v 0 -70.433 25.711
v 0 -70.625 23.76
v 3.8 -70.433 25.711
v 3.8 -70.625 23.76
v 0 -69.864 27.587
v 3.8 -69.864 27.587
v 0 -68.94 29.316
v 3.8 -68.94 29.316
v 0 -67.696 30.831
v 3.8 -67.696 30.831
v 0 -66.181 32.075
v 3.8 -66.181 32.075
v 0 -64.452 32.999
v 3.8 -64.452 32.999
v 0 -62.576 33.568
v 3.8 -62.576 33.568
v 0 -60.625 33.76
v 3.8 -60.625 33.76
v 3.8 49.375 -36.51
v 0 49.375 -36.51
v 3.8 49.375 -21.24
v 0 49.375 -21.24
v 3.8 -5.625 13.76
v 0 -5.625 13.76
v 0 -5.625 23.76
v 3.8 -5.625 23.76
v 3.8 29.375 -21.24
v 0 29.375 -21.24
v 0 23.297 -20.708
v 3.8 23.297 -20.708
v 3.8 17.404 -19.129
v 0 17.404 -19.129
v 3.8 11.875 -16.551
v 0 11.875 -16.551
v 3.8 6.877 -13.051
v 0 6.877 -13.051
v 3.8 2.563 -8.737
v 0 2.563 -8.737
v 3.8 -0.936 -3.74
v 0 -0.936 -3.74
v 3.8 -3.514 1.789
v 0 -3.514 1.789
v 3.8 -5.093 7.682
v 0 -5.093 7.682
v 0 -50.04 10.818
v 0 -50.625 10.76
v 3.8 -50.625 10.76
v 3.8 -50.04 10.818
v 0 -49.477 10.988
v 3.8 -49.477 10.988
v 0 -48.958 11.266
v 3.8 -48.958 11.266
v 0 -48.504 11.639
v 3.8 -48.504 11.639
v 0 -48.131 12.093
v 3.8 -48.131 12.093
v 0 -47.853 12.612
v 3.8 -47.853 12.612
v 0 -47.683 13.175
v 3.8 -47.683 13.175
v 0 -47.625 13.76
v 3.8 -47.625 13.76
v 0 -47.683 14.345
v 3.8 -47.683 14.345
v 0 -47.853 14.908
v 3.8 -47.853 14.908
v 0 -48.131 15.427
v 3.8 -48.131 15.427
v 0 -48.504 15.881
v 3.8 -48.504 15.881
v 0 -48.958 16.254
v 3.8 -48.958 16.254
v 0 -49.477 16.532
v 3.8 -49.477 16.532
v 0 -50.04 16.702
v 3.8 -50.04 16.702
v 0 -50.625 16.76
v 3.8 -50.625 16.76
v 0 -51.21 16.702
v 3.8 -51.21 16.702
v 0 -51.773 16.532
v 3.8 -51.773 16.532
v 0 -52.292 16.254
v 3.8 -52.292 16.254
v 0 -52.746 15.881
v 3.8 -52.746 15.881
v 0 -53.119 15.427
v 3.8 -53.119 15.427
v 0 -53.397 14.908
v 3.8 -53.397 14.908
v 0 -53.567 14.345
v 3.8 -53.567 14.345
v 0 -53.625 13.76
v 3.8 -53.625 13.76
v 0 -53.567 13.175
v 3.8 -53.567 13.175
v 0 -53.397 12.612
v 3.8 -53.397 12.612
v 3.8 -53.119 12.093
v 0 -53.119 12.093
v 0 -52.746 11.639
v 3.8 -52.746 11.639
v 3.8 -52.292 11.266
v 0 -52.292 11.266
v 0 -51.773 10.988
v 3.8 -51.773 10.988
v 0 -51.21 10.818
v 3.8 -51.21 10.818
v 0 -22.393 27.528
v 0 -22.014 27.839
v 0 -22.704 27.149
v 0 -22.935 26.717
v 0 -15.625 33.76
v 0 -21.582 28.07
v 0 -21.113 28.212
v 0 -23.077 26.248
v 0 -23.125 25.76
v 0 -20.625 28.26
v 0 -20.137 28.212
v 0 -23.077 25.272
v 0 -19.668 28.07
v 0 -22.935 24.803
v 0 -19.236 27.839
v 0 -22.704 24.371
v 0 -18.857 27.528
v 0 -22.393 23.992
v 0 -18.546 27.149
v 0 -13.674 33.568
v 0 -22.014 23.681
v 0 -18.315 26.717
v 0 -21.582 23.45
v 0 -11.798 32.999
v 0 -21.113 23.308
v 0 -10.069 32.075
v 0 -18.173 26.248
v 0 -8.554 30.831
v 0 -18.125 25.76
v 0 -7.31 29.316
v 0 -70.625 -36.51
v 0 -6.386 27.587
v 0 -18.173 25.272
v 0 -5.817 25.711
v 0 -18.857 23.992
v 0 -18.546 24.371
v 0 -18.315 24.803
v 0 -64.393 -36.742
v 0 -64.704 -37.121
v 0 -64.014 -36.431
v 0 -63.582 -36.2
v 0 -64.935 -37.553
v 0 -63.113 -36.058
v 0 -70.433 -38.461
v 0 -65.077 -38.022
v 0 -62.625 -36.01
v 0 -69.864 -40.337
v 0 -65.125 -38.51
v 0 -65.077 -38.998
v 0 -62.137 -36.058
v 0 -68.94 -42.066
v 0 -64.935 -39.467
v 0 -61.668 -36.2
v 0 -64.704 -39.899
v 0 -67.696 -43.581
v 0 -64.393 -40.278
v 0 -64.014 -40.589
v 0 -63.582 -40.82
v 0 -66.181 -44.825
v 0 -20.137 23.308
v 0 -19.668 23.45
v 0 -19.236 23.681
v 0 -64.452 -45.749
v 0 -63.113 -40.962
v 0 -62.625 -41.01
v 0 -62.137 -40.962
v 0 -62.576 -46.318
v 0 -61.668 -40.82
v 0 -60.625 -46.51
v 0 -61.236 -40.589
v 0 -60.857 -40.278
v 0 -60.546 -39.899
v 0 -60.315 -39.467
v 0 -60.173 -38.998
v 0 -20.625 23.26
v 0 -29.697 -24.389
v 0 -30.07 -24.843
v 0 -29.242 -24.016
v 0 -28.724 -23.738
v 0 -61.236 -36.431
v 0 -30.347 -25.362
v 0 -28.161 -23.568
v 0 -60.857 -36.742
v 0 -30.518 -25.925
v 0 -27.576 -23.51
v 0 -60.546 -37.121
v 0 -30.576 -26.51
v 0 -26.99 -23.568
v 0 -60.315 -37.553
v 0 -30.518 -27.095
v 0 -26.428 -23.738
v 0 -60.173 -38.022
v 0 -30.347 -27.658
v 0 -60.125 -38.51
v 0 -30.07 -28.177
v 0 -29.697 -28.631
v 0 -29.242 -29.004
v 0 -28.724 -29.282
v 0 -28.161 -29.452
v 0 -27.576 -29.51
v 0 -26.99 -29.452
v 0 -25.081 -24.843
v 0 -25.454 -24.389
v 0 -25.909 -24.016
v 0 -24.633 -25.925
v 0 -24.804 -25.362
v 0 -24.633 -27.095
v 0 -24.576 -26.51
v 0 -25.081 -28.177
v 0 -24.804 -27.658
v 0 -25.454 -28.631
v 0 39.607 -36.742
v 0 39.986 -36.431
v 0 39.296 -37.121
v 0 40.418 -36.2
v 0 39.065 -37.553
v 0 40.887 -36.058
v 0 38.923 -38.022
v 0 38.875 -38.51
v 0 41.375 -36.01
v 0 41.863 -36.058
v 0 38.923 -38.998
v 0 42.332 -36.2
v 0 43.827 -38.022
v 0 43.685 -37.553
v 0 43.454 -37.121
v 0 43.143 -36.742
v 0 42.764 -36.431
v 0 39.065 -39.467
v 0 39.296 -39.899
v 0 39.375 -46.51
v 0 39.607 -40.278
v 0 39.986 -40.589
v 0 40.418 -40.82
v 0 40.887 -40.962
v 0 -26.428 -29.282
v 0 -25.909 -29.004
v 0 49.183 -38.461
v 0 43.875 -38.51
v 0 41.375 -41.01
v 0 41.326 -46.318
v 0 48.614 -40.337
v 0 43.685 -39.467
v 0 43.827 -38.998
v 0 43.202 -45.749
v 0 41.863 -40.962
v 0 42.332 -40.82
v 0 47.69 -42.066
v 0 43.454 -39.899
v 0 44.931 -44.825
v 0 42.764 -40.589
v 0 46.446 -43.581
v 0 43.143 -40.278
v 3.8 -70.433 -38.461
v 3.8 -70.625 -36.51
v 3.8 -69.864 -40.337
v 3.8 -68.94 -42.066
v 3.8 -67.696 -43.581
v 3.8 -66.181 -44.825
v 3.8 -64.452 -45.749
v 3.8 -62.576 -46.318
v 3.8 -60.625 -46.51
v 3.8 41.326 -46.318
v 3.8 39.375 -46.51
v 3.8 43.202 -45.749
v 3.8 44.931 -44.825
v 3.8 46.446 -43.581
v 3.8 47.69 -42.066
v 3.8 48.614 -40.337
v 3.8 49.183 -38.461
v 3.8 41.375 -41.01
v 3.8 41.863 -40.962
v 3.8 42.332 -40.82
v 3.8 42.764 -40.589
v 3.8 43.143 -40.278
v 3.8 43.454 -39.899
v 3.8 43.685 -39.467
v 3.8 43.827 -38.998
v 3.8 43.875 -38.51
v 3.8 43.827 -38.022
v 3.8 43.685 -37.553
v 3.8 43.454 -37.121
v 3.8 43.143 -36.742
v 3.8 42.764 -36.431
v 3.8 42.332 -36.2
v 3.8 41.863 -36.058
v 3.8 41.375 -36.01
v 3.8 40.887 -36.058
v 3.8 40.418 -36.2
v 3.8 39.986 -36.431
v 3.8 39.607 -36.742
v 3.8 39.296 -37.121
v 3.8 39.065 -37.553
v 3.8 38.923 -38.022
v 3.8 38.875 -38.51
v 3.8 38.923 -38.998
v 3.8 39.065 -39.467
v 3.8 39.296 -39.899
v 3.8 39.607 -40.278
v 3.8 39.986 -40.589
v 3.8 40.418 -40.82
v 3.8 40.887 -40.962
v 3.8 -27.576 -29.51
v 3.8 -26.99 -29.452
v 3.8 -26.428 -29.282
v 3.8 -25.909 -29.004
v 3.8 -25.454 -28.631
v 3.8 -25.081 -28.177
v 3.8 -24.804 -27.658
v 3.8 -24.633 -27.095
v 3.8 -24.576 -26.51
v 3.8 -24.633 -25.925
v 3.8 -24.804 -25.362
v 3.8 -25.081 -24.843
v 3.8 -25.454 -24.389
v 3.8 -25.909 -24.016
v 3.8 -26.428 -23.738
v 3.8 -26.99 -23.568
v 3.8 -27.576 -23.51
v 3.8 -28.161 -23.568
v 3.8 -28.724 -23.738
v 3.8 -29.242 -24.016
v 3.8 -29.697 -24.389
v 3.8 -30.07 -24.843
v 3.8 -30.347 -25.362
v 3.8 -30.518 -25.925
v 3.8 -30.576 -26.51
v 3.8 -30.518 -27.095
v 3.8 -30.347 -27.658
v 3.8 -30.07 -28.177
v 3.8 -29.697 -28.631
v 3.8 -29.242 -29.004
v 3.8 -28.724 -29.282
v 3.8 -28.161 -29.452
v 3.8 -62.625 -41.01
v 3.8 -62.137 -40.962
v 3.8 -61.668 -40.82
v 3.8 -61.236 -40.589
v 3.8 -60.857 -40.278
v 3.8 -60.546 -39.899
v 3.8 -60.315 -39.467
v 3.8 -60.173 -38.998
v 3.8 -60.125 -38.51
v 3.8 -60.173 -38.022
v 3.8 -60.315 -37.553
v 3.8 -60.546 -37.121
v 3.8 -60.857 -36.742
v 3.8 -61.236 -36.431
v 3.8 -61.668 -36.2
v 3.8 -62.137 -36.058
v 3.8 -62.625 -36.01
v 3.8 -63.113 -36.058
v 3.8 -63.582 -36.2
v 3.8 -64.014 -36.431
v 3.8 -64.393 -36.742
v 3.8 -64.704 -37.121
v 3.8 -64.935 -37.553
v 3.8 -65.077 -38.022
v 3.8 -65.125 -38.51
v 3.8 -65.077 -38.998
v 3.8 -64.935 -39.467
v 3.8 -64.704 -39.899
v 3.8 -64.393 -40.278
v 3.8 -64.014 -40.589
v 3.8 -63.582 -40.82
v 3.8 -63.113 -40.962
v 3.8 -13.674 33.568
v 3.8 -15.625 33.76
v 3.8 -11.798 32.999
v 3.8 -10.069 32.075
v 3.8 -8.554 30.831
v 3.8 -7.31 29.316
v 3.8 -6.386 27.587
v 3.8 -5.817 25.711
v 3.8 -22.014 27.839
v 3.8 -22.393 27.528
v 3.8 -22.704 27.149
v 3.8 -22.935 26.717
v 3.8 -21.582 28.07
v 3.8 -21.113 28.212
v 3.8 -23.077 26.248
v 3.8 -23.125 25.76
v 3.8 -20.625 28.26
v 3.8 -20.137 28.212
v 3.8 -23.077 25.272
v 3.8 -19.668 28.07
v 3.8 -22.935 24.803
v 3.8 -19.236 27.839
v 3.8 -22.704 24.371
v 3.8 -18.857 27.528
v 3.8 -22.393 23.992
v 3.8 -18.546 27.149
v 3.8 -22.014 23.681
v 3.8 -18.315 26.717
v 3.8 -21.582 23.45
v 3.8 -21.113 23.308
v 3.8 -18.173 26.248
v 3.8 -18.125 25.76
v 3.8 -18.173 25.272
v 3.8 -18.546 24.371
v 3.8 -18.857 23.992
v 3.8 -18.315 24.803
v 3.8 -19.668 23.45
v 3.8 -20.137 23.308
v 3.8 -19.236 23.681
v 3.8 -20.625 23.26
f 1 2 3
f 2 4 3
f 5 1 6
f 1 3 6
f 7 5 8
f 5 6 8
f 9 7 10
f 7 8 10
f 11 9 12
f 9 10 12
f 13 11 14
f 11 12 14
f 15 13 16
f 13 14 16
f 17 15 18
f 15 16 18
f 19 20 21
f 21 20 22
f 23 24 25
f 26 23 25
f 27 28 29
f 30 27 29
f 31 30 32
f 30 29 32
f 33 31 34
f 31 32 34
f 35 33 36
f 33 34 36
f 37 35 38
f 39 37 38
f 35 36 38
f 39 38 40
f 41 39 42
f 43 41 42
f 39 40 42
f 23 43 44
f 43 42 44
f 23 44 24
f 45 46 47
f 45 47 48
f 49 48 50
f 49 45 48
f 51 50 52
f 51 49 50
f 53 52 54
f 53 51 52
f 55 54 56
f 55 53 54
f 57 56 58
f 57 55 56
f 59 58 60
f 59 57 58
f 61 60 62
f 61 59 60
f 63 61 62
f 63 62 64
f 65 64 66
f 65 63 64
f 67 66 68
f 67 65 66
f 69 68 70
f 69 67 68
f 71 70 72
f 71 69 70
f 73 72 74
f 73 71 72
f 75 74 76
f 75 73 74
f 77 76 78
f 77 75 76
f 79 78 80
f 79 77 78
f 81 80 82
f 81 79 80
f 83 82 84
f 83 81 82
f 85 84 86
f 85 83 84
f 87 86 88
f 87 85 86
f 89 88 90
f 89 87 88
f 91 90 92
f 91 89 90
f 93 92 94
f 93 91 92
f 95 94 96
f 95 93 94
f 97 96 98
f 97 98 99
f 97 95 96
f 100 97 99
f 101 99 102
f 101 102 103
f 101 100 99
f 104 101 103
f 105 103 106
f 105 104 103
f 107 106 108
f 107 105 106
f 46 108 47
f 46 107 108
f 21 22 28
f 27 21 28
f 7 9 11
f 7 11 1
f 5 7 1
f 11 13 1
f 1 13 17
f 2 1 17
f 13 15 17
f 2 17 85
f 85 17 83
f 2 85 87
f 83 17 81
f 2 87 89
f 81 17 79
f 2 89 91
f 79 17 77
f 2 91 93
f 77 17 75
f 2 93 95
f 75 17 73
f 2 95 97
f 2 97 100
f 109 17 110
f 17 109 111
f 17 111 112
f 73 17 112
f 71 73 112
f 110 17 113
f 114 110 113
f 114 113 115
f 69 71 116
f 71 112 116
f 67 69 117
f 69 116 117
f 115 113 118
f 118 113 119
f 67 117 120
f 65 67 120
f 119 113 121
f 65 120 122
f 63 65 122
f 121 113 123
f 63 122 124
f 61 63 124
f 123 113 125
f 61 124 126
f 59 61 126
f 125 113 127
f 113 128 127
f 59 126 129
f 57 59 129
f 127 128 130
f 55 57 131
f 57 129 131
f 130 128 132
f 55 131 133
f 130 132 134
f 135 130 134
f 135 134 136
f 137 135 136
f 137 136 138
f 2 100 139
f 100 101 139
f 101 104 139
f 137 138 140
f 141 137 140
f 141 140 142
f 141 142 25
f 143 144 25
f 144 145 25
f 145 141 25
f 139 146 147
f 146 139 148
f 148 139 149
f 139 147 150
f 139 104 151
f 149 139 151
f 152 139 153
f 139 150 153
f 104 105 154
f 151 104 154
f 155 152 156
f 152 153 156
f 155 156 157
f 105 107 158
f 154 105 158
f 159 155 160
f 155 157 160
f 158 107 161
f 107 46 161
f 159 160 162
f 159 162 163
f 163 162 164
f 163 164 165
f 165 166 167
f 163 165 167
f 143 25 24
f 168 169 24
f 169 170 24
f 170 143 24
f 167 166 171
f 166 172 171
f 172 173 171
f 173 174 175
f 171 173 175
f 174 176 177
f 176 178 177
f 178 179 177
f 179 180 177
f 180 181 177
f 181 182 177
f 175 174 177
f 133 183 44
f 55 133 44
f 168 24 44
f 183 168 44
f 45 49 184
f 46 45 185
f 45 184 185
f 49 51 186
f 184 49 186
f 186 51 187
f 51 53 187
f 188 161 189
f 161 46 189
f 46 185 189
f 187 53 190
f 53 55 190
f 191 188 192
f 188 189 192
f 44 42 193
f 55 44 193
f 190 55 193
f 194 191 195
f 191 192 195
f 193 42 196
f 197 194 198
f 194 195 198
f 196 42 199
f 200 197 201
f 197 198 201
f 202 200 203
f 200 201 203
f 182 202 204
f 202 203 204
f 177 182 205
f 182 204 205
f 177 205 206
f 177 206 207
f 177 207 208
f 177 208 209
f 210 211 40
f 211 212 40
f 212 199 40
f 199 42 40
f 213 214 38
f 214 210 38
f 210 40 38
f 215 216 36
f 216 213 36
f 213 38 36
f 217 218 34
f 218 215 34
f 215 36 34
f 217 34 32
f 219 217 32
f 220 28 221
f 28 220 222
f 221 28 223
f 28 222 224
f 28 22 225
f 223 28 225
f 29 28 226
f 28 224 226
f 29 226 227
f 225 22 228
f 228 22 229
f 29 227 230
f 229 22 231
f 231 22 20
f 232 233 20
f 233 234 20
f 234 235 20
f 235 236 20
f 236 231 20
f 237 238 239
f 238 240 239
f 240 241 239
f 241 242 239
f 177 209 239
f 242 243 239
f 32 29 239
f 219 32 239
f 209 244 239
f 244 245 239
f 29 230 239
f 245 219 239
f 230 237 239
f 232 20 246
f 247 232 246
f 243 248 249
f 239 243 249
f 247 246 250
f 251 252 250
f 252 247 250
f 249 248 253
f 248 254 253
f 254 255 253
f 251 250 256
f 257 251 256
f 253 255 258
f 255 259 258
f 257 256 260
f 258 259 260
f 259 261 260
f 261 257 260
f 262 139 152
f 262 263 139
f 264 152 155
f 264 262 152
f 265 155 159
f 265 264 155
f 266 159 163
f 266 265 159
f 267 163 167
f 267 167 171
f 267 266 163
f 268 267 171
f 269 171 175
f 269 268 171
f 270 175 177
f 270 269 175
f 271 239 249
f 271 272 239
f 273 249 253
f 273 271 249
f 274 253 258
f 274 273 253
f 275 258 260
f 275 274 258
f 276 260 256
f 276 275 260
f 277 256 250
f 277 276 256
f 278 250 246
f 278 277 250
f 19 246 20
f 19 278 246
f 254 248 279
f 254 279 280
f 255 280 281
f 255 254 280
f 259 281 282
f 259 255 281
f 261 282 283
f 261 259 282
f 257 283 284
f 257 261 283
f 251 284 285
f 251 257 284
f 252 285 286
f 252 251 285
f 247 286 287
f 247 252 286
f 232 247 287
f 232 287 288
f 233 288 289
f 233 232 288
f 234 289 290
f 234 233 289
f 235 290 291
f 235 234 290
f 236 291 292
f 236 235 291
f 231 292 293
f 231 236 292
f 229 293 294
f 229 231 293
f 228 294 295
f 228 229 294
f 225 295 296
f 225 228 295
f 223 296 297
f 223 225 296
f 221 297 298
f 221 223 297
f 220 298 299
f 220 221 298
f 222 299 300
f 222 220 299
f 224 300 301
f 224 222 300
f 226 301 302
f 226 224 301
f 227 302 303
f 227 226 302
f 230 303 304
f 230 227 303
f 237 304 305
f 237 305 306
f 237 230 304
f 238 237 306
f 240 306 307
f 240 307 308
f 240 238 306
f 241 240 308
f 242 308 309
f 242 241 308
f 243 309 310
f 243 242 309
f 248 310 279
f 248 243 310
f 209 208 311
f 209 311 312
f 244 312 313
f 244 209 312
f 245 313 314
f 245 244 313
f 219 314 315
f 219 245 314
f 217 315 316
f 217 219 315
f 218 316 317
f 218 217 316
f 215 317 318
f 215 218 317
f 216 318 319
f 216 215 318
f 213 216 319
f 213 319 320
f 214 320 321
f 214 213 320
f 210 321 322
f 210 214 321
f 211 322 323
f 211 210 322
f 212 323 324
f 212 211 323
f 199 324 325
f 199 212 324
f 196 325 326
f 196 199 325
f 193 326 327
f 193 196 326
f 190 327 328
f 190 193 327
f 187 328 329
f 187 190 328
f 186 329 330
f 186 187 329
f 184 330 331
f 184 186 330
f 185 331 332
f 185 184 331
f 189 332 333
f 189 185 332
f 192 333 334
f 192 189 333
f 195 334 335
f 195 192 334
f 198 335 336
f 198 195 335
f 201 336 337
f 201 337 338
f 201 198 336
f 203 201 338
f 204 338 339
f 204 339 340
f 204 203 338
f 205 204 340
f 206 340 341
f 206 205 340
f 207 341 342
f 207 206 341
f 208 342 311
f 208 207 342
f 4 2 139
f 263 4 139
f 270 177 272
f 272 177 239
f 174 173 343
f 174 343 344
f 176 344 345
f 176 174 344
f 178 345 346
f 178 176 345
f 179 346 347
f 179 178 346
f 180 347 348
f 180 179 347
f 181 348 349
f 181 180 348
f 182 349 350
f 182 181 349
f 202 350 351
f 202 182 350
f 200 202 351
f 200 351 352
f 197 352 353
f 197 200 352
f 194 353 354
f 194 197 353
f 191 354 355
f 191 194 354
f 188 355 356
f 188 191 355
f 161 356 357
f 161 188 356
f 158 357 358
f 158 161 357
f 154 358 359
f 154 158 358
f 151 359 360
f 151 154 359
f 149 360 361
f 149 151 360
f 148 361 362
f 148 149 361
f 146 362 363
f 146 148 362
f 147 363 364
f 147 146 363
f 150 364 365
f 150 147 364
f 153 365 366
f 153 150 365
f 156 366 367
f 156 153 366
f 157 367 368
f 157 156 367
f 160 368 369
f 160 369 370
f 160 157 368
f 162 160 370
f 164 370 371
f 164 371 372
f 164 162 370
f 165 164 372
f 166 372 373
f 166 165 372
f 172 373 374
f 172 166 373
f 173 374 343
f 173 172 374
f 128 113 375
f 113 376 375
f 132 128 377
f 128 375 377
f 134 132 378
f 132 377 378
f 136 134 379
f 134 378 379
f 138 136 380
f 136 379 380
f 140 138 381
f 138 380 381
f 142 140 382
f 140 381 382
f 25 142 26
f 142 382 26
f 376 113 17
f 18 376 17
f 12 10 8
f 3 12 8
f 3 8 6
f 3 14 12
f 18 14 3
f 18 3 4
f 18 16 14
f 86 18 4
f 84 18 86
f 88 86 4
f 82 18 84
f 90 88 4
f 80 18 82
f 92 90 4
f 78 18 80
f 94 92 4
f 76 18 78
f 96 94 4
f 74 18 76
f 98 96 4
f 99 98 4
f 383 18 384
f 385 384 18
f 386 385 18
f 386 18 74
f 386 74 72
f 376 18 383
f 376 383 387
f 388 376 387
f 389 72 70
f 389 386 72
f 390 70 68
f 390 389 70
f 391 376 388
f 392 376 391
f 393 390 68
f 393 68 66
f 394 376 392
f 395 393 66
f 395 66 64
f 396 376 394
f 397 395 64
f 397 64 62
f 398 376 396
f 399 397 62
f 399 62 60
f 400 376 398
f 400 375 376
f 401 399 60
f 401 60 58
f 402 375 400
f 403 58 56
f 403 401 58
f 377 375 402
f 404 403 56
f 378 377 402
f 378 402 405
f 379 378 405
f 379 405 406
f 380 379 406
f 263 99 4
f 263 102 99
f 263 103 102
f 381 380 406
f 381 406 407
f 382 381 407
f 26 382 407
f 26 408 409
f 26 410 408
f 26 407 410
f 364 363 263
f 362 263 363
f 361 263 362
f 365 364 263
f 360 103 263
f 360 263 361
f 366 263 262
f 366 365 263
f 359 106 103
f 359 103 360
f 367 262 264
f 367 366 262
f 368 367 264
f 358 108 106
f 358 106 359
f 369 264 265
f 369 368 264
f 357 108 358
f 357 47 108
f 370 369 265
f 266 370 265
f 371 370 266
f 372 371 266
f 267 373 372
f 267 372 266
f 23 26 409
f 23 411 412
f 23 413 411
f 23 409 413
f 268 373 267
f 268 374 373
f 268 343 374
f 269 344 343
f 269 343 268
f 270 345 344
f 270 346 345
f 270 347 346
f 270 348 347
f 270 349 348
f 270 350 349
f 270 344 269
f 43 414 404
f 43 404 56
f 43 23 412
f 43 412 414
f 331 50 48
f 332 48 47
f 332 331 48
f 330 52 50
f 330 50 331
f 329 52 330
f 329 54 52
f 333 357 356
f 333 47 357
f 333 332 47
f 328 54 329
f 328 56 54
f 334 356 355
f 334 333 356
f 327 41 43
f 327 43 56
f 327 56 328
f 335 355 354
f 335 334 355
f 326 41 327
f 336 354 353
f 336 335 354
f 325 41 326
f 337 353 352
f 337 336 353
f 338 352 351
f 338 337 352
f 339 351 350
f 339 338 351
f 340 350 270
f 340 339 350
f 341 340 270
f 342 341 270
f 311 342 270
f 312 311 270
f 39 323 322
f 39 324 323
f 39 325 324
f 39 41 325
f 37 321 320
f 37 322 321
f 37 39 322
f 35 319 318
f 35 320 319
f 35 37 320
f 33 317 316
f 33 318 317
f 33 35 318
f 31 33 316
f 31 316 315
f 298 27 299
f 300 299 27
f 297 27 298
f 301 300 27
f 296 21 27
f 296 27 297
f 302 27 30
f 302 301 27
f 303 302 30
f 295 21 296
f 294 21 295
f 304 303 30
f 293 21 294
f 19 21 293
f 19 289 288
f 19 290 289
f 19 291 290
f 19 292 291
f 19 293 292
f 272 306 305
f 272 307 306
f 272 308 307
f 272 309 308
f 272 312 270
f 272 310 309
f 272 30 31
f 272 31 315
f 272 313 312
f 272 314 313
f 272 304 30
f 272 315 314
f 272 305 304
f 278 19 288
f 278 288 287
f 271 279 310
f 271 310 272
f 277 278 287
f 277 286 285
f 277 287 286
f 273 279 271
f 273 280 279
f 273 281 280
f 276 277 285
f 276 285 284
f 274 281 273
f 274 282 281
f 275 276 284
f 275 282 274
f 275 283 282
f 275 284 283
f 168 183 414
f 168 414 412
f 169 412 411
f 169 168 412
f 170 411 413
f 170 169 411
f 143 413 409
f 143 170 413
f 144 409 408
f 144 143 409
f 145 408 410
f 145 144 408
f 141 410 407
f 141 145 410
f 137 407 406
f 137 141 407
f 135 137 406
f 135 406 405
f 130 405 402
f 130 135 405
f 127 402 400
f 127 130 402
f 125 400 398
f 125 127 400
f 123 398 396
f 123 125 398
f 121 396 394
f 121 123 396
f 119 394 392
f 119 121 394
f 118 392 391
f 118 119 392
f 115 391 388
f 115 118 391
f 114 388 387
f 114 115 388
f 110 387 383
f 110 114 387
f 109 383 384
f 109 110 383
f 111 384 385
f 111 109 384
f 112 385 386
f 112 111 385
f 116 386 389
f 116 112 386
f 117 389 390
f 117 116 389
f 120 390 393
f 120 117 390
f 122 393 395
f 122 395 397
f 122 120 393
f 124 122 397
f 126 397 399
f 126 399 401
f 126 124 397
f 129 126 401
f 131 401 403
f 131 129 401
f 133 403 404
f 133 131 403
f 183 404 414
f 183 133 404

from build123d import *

# Parameters (mm, degrees)
SKETCH1_R           = 3
SKETCH1_R_2         = 2.5
BOSS_EXTRUDE1_DEPTH = 3.8
FILLET1_R           = 10


with BuildPart() as part:
    # Sketch1 → Boss-Extrude1 (new body)
    with BuildSketch(Plane(origin=(0, 0, 0), x_dir=(0, 0, -1), z_dir=(1, 0, 0))):
        with BuildLine():
            Line((-33.760087735, -70.625), (46.510087735, -70.625))
            Line((46.510087735, -70.625), (46.510087735, 49.375))
            Line((46.510087735, 49.375), (21.239912265, 49.375))
            Line((21.239912265, 49.375), (21.239912265, 29.375))
            ThreePointArc((21.239912265, 29.375), (10.988649606, 4.626262658), (-13.760087735, -5.625))
            Line((-13.760087735, -5.625), (-33.760087735, -5.625))
            Line((-33.760087735, -5.625), (-33.760087735, -70.625))
        make_face()
        with Locations((-13.760087735, -50.625)):
            Circle(SKETCH1_R, mode=Mode.SUBTRACT)
        with Locations((26.510087735, -27.575640625)):
            Circle(SKETCH1_R, mode=Mode.SUBTRACT)
        with Locations((38.510087735, 41.375)):
            Circle(SKETCH1_R_2, mode=Mode.SUBTRACT)
        with Locations((38.510087735, -62.625)):
            Circle(SKETCH1_R_2, mode=Mode.SUBTRACT)
        with Locations((-25.760087735, -20.625)):
            Circle(SKETCH1_R_2, mode=Mode.SUBTRACT)
    extrude(amount=BOSS_EXTRUDE1_DEPTH)

    # Fillet1
    fillet1_edges = [part.edges().sort_by_distance(p)[0] for p in [
        (1.9, -70.625, -46.510087735),
        (1.9, -70.625, 33.760087735),
        (1.9, -5.625, 33.760087735),
        (1.9, 49.375, -46.510087735),
    ]]
    fillet(fillet1_edges, radius=FILLET1_R)


solid = part.part
